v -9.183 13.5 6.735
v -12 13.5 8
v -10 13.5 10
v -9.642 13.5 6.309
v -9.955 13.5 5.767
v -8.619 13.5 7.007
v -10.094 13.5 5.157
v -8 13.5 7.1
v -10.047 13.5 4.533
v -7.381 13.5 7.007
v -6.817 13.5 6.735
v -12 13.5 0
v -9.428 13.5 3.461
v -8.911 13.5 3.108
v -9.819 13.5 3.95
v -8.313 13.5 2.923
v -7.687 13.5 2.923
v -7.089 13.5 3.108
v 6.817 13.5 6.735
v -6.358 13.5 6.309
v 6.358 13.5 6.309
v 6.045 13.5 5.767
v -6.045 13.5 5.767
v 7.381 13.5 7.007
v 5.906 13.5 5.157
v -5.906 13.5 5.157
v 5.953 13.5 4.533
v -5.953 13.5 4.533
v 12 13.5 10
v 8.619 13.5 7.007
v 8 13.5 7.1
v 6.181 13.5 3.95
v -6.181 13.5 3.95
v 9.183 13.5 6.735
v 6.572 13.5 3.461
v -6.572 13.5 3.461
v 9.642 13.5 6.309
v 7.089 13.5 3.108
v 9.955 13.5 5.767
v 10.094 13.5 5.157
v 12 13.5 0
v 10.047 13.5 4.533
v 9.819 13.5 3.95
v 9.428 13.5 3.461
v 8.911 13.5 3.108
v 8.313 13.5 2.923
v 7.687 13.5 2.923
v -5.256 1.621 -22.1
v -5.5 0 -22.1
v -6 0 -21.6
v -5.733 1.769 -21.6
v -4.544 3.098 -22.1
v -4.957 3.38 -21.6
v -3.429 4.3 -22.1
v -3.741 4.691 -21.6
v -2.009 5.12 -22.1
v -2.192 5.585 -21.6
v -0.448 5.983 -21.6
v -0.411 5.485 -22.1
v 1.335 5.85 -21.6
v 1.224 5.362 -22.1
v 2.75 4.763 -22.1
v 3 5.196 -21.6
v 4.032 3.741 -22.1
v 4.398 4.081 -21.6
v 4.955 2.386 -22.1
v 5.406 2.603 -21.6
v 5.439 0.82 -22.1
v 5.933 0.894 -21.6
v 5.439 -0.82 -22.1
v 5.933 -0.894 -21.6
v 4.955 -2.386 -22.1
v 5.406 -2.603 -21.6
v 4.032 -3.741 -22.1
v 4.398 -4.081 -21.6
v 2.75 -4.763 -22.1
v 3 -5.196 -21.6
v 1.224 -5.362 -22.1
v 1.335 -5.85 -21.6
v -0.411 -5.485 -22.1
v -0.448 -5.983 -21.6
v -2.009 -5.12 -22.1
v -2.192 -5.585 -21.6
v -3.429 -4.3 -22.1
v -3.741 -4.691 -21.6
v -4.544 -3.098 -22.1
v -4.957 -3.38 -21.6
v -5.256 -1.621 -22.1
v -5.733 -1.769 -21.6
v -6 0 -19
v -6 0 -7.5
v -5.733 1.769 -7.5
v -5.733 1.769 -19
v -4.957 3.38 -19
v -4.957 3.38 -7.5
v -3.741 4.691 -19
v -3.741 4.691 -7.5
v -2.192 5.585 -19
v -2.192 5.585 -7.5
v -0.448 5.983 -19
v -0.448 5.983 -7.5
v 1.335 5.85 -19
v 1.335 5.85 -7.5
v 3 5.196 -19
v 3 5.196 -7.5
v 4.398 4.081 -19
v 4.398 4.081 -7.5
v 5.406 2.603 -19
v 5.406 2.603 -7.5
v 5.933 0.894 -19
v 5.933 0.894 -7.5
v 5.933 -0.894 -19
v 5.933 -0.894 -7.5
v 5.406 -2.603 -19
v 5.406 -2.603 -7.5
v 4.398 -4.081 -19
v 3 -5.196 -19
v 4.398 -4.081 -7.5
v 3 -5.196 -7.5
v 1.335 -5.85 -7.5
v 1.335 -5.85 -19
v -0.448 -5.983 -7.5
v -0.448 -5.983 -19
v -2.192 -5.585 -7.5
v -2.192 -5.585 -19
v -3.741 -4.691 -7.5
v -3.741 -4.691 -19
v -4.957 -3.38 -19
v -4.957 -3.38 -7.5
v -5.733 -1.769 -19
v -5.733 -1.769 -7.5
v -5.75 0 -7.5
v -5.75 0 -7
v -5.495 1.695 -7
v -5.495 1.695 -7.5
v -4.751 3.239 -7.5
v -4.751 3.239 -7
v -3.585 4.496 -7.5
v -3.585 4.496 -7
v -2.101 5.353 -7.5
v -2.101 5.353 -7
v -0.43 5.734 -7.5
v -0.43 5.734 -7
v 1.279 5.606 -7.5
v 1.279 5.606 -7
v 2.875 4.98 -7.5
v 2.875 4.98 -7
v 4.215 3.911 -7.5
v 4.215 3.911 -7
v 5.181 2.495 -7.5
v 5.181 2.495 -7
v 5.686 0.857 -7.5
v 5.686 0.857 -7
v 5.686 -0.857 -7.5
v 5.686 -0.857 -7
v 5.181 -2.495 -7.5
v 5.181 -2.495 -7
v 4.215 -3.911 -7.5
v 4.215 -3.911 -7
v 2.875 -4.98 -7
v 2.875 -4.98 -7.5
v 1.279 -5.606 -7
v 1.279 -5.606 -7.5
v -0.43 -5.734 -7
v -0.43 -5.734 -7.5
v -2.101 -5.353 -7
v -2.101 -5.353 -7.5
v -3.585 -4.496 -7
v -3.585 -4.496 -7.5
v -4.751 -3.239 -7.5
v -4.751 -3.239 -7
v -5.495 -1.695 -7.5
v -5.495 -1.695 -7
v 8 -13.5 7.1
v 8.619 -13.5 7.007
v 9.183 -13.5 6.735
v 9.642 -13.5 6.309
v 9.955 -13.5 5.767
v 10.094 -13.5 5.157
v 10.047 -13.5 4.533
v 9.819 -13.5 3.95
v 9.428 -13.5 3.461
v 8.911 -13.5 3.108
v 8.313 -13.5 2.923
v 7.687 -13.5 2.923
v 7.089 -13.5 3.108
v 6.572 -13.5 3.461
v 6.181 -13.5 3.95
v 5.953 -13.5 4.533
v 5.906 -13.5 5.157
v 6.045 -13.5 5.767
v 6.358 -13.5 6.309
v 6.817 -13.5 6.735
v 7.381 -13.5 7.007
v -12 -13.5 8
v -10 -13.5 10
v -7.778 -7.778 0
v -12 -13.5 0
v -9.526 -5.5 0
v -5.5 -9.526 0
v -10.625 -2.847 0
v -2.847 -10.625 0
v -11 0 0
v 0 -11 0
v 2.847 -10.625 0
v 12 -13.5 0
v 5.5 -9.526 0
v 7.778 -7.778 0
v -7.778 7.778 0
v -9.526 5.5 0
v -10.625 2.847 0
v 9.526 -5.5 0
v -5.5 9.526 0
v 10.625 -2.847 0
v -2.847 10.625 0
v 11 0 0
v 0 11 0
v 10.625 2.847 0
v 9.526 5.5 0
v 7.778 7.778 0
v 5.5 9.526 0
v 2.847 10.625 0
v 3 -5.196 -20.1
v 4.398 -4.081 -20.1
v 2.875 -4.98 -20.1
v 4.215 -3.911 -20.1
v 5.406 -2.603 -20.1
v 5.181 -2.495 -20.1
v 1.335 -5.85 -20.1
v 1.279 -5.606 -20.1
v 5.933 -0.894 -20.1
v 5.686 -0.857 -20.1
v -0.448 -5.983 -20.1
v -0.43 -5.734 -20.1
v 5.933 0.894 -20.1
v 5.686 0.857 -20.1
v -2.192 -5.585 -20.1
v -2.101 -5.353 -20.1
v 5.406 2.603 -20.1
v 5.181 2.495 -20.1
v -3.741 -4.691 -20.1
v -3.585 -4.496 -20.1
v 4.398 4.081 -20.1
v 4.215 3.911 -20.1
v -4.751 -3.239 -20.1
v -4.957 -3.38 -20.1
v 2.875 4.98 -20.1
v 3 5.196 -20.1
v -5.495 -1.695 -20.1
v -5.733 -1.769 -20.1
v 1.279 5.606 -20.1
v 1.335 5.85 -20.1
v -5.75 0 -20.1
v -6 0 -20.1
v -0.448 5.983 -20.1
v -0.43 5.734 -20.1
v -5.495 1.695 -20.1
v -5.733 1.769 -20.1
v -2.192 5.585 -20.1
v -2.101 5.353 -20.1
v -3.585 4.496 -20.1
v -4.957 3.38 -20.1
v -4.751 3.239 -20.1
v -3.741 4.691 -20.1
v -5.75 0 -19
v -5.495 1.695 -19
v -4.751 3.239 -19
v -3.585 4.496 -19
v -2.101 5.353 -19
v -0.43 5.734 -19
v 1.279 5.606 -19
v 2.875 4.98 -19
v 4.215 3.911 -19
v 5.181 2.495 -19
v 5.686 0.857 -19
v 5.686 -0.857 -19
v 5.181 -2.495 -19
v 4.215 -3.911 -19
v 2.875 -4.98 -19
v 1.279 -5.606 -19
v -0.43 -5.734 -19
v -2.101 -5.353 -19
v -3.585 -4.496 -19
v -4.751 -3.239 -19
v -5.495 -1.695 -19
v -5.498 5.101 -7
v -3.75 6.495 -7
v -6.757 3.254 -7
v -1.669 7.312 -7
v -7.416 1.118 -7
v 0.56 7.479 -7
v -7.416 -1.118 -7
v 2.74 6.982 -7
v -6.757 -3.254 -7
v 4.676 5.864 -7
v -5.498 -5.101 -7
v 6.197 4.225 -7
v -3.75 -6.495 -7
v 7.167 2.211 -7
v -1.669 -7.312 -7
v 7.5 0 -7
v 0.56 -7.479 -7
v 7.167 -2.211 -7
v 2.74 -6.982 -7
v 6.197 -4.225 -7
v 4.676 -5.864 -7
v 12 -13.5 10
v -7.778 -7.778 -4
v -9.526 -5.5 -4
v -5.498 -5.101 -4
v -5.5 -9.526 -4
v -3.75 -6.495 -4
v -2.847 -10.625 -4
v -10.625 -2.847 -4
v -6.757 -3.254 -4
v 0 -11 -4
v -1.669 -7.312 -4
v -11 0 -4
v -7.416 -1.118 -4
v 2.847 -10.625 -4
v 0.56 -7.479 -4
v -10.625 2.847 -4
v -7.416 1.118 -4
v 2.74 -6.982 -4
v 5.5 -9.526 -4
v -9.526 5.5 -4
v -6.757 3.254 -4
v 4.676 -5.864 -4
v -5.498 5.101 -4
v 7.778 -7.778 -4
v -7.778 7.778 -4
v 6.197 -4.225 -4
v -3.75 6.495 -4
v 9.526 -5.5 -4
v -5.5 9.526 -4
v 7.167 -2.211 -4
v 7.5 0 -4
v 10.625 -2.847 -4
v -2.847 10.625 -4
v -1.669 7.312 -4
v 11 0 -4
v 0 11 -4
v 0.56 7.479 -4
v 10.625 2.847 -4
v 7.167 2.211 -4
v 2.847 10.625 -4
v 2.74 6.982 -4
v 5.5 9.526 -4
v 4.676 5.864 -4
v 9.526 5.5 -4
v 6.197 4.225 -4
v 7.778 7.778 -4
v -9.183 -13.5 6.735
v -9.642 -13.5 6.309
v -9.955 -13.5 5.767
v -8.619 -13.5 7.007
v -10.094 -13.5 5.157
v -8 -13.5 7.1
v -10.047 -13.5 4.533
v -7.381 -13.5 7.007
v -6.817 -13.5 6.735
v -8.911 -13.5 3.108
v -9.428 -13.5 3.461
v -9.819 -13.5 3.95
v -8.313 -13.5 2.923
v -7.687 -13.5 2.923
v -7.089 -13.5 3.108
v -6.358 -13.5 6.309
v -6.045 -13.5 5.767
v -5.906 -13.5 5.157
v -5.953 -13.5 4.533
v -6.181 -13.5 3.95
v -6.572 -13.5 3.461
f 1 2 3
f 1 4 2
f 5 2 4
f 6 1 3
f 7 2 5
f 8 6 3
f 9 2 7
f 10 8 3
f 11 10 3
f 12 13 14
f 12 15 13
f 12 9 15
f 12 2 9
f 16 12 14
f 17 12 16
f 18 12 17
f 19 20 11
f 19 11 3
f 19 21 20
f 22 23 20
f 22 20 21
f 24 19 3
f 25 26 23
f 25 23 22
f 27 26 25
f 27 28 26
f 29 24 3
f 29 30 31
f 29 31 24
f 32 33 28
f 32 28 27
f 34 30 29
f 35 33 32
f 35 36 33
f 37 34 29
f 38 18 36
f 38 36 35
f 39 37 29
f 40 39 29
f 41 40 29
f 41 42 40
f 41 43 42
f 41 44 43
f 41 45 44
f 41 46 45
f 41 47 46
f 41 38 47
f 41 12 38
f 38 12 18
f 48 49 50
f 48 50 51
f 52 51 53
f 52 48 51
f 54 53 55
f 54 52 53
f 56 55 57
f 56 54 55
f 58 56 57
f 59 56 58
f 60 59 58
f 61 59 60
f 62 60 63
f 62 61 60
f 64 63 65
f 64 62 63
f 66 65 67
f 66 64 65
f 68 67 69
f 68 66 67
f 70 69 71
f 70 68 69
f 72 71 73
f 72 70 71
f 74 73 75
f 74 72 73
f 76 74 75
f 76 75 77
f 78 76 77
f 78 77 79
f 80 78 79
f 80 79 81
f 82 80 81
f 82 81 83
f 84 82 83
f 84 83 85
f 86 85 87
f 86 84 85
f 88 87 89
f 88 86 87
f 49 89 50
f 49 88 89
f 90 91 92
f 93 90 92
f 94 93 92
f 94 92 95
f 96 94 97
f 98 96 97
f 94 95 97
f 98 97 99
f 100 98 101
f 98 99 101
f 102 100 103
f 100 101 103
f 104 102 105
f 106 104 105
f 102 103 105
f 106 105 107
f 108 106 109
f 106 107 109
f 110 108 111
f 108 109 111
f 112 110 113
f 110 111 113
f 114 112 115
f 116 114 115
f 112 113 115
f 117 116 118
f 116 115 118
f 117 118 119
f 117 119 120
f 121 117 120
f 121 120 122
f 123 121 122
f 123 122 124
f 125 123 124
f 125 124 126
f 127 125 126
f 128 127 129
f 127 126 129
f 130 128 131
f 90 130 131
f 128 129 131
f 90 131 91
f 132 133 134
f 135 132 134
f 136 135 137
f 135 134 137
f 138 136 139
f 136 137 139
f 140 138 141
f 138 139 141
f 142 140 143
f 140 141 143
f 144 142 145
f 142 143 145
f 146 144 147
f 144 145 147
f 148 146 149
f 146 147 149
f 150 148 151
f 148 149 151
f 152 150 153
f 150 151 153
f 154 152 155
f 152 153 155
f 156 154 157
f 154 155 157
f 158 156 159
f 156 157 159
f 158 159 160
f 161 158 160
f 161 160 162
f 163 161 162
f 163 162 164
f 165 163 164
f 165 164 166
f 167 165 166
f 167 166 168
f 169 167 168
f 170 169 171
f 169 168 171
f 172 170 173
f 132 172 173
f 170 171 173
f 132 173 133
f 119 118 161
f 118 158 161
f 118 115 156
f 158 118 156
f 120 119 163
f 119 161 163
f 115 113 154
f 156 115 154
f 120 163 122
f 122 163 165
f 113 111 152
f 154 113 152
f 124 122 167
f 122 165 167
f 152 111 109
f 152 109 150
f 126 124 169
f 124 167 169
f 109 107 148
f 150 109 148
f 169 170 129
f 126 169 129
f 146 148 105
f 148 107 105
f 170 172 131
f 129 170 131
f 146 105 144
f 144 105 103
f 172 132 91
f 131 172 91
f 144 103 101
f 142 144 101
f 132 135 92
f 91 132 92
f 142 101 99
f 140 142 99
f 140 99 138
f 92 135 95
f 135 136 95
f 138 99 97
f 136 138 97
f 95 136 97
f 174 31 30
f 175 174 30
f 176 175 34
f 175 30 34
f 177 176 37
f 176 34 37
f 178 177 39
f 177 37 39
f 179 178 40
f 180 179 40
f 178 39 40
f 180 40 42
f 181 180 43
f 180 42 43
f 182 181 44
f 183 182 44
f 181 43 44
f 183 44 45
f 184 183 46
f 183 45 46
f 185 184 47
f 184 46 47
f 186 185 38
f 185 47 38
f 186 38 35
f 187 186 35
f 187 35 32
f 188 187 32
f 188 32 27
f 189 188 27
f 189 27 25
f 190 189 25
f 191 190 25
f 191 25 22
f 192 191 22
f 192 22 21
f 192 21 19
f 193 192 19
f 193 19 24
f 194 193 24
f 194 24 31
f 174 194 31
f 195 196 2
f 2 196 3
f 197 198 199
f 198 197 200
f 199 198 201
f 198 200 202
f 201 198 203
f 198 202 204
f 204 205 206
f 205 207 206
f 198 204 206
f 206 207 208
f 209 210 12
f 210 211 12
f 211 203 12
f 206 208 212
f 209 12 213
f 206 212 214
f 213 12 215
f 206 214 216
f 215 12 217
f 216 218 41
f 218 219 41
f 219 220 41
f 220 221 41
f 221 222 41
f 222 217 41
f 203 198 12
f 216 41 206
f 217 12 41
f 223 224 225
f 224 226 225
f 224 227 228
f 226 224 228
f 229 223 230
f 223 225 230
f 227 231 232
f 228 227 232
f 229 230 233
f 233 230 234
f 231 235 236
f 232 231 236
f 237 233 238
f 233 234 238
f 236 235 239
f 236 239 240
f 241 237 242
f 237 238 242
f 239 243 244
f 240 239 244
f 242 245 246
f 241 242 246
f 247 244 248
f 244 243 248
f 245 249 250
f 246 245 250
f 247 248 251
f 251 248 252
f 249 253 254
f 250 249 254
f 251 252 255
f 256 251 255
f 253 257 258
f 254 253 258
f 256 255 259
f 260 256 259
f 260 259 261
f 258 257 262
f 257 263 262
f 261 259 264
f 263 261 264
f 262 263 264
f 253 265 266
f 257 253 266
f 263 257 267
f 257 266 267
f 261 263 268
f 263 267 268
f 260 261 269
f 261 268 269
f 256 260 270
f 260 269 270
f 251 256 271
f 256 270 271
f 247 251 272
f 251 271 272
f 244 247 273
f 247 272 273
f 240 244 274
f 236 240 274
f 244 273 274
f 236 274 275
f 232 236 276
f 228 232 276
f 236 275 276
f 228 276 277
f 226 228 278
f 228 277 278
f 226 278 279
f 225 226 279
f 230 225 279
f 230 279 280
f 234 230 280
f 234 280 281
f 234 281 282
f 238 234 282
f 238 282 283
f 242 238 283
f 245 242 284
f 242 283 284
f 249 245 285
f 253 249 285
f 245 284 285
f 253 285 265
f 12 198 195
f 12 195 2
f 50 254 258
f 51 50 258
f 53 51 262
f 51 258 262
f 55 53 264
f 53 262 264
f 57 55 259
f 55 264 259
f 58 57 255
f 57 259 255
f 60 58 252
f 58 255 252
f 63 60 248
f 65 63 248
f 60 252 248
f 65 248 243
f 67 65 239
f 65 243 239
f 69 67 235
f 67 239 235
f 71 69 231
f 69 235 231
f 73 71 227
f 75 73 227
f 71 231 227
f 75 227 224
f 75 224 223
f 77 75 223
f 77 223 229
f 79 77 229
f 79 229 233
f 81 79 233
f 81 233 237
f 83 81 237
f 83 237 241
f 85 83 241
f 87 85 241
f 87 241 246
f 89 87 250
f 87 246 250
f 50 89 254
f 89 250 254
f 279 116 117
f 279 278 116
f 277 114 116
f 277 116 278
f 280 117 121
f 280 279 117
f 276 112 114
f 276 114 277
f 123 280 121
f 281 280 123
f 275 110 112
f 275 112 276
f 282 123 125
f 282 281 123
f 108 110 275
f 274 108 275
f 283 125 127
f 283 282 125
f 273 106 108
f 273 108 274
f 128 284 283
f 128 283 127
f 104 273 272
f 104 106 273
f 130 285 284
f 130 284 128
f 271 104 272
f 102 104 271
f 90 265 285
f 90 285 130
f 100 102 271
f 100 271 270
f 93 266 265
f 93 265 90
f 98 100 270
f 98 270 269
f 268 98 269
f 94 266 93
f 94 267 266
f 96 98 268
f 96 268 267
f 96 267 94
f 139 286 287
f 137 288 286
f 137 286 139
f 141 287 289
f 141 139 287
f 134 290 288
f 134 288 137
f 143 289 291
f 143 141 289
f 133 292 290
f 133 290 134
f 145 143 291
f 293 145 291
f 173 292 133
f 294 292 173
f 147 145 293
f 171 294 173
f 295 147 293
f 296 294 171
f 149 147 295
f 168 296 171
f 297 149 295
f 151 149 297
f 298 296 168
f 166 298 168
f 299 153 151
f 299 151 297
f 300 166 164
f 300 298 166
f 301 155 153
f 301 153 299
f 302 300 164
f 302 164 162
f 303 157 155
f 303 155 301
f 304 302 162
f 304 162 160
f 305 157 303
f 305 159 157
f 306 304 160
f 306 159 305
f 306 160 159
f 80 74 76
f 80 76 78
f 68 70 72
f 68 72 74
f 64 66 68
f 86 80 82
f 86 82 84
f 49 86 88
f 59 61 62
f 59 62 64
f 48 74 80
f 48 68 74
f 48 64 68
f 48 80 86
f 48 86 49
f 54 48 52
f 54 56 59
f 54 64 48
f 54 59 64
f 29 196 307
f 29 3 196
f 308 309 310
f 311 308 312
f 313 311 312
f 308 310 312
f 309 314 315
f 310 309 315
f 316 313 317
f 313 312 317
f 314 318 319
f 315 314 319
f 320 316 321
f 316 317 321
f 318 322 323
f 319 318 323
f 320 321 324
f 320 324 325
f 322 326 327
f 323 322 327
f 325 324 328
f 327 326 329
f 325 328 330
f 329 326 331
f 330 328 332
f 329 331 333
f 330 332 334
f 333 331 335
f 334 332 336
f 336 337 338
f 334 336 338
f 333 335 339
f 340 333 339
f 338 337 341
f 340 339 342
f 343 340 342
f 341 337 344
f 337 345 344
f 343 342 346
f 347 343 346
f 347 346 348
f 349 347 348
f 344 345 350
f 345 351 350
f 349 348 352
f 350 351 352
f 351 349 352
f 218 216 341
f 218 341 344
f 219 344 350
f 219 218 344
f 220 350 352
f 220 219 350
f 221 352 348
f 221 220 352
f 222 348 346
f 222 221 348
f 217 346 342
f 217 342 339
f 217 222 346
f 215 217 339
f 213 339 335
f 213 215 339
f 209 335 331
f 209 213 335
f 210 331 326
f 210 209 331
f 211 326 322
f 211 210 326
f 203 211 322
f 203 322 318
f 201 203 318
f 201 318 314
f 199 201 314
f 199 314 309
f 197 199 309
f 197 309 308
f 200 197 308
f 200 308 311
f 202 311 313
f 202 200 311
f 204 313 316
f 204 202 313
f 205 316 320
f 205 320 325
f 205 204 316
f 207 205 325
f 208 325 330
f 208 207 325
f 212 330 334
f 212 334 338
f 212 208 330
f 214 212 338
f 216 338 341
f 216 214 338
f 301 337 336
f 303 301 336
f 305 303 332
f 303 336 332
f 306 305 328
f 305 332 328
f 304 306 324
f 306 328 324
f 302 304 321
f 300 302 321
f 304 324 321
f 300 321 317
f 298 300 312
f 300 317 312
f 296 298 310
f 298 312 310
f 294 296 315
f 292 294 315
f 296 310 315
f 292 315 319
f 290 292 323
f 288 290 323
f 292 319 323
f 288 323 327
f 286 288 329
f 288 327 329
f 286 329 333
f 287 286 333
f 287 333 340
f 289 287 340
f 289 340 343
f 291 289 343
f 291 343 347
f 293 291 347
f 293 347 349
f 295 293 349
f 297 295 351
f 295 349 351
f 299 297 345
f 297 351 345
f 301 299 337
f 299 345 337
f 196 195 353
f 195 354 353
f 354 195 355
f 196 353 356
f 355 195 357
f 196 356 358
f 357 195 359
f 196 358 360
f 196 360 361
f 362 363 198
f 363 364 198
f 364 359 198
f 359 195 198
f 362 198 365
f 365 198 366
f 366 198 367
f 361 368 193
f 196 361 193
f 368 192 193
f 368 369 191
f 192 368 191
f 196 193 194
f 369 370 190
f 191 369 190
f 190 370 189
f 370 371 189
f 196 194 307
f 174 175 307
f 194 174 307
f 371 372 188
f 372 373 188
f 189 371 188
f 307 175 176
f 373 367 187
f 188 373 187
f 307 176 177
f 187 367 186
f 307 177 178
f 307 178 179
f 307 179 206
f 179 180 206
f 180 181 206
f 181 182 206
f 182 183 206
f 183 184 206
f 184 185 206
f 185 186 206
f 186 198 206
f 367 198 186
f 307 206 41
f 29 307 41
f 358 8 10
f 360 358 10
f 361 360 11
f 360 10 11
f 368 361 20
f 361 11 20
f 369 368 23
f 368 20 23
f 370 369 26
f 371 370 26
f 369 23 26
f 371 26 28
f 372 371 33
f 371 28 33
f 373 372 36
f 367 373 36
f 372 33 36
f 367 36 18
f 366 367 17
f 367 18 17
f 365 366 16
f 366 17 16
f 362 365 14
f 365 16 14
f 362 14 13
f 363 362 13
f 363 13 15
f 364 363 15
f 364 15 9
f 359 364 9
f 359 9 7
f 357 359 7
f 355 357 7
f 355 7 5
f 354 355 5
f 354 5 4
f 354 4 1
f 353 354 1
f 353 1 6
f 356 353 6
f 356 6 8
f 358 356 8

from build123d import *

# Parameters (mm, degrees)
SKETCH_1_W          = 24
SKETCH_1_H          = 27
EXTRUDE_1_DEPTH     = 10
SKETCH_4_R          = 2.1
CUT_EXTRUDE_2_DEPTH = 37.013519789
SKETCH_2_R          = 11
EXTRUDE_2_DEPTH     = 4
SKETCH_5_R          = 7.5
EXTRUDE_3_DEPTH     = 3
SKETCH_6_R          = 5.75
EXTRUDE_4_DEPTH     = 0.5
SKETCH_7_R          = 6
EXTRUDE_5_DEPTH     = 11.5
SKETCH_8_R          = 5.75
EXTRUDE_6_DEPTH     = 1.1
SKETCH_9_R          = 6
EXTRUDE_7_DEPTH     = 2
CHAMFER_1_SIZE      = 0.5
CHAMFER_2_SIZE      = 2


with BuildPart() as part:
    # 草图1 → 凸台-拉伸1 (new body)
    with BuildSketch(Plane.XY):
        Rectangle(SKETCH_1_W, SKETCH_1_H)
    extrude(amount=EXTRUDE_1_DEPTH)

    # 草图4 → 切除-拉伸2 (cut)
    with BuildSketch(Plane(origin=(0, 13.5, 0), x_dir=(1, 0, 0), z_dir=(0, 1, 0))):
        with Locations(Location((-8, -5, 0), (0, 0, 270))):
            Circle(SKETCH_4_R)
        with Locations(Location((8, -5, 0), (0, 0, 270))):
            Circle(SKETCH_4_R)
    extrude(amount=-CUT_EXTRUDE_2_DEPTH, mode=Mode.SUBTRACT)

    # 草图2 → 凸台-拉伸2 (add)
    with BuildSketch(Plane.XY):
        Circle(SKETCH_2_R)
    extrude(amount=-EXTRUDE_2_DEPTH)

    # 草图5 → 凸台-拉伸3 (add)
    with BuildSketch(Plane(origin=(0, 0, -4), x_dir=(-1, 0, 0), z_dir=(0, 0, -1))):
        with Locations(Location((0, 0, 0), (0, 0, 180))):
            Circle(SKETCH_5_R)
    extrude(amount=EXTRUDE_3_DEPTH)

    # 草图6 → 凸台-拉伸4 (add)
    with BuildSketch(Plane(origin=(0, 0, -7), x_dir=(-1, 0, 0), z_dir=(0, 0, -1))):
        Circle(SKETCH_6_R)
    extrude(amount=EXTRUDE_4_DEPTH)

    # 草图7 → 凸台-拉伸5 (add)
    with BuildSketch(Plane(origin=(0, 0, -7.5), x_dir=(-1, 0, 0), z_dir=(0, 0, -1))):
        Circle(SKETCH_7_R)
    extrude(amount=EXTRUDE_5_DEPTH)

    # 草图8 → 凸台-拉伸6 (add)
    with BuildSketch(Plane(origin=(0, 0, -19), x_dir=(-1, 0, 0), z_dir=(0, 0, -1))):
        Circle(SKETCH_8_R)
    extrude(amount=EXTRUDE_6_DEPTH)

    # 草图9 → 凸台-拉伸7 (add)
    with BuildSketch(Plane(origin=(0, 0, -20.1), x_dir=(-1, 0, 0), z_dir=(0, 0, -1))):
        Circle(SKETCH_9_R)
    extrude(amount=EXTRUDE_7_DEPTH)

    # 倒角1
    chamfer_1_edges = [part.edges().sort_by_distance(p)[0] for p in [
        (6, 0, -22.1),
    ]]
    chamfer(chamfer_1_edges, length=CHAMFER_1_SIZE)

    # 倒角2
    chamfer_2_edges = [part.edges().sort_by_distance(p)[0] for p in [
        (-12, 0, 10),
    ]]
    chamfer(chamfer_2_edges, length=CHAMFER_2_SIZE)


solid = part.part
